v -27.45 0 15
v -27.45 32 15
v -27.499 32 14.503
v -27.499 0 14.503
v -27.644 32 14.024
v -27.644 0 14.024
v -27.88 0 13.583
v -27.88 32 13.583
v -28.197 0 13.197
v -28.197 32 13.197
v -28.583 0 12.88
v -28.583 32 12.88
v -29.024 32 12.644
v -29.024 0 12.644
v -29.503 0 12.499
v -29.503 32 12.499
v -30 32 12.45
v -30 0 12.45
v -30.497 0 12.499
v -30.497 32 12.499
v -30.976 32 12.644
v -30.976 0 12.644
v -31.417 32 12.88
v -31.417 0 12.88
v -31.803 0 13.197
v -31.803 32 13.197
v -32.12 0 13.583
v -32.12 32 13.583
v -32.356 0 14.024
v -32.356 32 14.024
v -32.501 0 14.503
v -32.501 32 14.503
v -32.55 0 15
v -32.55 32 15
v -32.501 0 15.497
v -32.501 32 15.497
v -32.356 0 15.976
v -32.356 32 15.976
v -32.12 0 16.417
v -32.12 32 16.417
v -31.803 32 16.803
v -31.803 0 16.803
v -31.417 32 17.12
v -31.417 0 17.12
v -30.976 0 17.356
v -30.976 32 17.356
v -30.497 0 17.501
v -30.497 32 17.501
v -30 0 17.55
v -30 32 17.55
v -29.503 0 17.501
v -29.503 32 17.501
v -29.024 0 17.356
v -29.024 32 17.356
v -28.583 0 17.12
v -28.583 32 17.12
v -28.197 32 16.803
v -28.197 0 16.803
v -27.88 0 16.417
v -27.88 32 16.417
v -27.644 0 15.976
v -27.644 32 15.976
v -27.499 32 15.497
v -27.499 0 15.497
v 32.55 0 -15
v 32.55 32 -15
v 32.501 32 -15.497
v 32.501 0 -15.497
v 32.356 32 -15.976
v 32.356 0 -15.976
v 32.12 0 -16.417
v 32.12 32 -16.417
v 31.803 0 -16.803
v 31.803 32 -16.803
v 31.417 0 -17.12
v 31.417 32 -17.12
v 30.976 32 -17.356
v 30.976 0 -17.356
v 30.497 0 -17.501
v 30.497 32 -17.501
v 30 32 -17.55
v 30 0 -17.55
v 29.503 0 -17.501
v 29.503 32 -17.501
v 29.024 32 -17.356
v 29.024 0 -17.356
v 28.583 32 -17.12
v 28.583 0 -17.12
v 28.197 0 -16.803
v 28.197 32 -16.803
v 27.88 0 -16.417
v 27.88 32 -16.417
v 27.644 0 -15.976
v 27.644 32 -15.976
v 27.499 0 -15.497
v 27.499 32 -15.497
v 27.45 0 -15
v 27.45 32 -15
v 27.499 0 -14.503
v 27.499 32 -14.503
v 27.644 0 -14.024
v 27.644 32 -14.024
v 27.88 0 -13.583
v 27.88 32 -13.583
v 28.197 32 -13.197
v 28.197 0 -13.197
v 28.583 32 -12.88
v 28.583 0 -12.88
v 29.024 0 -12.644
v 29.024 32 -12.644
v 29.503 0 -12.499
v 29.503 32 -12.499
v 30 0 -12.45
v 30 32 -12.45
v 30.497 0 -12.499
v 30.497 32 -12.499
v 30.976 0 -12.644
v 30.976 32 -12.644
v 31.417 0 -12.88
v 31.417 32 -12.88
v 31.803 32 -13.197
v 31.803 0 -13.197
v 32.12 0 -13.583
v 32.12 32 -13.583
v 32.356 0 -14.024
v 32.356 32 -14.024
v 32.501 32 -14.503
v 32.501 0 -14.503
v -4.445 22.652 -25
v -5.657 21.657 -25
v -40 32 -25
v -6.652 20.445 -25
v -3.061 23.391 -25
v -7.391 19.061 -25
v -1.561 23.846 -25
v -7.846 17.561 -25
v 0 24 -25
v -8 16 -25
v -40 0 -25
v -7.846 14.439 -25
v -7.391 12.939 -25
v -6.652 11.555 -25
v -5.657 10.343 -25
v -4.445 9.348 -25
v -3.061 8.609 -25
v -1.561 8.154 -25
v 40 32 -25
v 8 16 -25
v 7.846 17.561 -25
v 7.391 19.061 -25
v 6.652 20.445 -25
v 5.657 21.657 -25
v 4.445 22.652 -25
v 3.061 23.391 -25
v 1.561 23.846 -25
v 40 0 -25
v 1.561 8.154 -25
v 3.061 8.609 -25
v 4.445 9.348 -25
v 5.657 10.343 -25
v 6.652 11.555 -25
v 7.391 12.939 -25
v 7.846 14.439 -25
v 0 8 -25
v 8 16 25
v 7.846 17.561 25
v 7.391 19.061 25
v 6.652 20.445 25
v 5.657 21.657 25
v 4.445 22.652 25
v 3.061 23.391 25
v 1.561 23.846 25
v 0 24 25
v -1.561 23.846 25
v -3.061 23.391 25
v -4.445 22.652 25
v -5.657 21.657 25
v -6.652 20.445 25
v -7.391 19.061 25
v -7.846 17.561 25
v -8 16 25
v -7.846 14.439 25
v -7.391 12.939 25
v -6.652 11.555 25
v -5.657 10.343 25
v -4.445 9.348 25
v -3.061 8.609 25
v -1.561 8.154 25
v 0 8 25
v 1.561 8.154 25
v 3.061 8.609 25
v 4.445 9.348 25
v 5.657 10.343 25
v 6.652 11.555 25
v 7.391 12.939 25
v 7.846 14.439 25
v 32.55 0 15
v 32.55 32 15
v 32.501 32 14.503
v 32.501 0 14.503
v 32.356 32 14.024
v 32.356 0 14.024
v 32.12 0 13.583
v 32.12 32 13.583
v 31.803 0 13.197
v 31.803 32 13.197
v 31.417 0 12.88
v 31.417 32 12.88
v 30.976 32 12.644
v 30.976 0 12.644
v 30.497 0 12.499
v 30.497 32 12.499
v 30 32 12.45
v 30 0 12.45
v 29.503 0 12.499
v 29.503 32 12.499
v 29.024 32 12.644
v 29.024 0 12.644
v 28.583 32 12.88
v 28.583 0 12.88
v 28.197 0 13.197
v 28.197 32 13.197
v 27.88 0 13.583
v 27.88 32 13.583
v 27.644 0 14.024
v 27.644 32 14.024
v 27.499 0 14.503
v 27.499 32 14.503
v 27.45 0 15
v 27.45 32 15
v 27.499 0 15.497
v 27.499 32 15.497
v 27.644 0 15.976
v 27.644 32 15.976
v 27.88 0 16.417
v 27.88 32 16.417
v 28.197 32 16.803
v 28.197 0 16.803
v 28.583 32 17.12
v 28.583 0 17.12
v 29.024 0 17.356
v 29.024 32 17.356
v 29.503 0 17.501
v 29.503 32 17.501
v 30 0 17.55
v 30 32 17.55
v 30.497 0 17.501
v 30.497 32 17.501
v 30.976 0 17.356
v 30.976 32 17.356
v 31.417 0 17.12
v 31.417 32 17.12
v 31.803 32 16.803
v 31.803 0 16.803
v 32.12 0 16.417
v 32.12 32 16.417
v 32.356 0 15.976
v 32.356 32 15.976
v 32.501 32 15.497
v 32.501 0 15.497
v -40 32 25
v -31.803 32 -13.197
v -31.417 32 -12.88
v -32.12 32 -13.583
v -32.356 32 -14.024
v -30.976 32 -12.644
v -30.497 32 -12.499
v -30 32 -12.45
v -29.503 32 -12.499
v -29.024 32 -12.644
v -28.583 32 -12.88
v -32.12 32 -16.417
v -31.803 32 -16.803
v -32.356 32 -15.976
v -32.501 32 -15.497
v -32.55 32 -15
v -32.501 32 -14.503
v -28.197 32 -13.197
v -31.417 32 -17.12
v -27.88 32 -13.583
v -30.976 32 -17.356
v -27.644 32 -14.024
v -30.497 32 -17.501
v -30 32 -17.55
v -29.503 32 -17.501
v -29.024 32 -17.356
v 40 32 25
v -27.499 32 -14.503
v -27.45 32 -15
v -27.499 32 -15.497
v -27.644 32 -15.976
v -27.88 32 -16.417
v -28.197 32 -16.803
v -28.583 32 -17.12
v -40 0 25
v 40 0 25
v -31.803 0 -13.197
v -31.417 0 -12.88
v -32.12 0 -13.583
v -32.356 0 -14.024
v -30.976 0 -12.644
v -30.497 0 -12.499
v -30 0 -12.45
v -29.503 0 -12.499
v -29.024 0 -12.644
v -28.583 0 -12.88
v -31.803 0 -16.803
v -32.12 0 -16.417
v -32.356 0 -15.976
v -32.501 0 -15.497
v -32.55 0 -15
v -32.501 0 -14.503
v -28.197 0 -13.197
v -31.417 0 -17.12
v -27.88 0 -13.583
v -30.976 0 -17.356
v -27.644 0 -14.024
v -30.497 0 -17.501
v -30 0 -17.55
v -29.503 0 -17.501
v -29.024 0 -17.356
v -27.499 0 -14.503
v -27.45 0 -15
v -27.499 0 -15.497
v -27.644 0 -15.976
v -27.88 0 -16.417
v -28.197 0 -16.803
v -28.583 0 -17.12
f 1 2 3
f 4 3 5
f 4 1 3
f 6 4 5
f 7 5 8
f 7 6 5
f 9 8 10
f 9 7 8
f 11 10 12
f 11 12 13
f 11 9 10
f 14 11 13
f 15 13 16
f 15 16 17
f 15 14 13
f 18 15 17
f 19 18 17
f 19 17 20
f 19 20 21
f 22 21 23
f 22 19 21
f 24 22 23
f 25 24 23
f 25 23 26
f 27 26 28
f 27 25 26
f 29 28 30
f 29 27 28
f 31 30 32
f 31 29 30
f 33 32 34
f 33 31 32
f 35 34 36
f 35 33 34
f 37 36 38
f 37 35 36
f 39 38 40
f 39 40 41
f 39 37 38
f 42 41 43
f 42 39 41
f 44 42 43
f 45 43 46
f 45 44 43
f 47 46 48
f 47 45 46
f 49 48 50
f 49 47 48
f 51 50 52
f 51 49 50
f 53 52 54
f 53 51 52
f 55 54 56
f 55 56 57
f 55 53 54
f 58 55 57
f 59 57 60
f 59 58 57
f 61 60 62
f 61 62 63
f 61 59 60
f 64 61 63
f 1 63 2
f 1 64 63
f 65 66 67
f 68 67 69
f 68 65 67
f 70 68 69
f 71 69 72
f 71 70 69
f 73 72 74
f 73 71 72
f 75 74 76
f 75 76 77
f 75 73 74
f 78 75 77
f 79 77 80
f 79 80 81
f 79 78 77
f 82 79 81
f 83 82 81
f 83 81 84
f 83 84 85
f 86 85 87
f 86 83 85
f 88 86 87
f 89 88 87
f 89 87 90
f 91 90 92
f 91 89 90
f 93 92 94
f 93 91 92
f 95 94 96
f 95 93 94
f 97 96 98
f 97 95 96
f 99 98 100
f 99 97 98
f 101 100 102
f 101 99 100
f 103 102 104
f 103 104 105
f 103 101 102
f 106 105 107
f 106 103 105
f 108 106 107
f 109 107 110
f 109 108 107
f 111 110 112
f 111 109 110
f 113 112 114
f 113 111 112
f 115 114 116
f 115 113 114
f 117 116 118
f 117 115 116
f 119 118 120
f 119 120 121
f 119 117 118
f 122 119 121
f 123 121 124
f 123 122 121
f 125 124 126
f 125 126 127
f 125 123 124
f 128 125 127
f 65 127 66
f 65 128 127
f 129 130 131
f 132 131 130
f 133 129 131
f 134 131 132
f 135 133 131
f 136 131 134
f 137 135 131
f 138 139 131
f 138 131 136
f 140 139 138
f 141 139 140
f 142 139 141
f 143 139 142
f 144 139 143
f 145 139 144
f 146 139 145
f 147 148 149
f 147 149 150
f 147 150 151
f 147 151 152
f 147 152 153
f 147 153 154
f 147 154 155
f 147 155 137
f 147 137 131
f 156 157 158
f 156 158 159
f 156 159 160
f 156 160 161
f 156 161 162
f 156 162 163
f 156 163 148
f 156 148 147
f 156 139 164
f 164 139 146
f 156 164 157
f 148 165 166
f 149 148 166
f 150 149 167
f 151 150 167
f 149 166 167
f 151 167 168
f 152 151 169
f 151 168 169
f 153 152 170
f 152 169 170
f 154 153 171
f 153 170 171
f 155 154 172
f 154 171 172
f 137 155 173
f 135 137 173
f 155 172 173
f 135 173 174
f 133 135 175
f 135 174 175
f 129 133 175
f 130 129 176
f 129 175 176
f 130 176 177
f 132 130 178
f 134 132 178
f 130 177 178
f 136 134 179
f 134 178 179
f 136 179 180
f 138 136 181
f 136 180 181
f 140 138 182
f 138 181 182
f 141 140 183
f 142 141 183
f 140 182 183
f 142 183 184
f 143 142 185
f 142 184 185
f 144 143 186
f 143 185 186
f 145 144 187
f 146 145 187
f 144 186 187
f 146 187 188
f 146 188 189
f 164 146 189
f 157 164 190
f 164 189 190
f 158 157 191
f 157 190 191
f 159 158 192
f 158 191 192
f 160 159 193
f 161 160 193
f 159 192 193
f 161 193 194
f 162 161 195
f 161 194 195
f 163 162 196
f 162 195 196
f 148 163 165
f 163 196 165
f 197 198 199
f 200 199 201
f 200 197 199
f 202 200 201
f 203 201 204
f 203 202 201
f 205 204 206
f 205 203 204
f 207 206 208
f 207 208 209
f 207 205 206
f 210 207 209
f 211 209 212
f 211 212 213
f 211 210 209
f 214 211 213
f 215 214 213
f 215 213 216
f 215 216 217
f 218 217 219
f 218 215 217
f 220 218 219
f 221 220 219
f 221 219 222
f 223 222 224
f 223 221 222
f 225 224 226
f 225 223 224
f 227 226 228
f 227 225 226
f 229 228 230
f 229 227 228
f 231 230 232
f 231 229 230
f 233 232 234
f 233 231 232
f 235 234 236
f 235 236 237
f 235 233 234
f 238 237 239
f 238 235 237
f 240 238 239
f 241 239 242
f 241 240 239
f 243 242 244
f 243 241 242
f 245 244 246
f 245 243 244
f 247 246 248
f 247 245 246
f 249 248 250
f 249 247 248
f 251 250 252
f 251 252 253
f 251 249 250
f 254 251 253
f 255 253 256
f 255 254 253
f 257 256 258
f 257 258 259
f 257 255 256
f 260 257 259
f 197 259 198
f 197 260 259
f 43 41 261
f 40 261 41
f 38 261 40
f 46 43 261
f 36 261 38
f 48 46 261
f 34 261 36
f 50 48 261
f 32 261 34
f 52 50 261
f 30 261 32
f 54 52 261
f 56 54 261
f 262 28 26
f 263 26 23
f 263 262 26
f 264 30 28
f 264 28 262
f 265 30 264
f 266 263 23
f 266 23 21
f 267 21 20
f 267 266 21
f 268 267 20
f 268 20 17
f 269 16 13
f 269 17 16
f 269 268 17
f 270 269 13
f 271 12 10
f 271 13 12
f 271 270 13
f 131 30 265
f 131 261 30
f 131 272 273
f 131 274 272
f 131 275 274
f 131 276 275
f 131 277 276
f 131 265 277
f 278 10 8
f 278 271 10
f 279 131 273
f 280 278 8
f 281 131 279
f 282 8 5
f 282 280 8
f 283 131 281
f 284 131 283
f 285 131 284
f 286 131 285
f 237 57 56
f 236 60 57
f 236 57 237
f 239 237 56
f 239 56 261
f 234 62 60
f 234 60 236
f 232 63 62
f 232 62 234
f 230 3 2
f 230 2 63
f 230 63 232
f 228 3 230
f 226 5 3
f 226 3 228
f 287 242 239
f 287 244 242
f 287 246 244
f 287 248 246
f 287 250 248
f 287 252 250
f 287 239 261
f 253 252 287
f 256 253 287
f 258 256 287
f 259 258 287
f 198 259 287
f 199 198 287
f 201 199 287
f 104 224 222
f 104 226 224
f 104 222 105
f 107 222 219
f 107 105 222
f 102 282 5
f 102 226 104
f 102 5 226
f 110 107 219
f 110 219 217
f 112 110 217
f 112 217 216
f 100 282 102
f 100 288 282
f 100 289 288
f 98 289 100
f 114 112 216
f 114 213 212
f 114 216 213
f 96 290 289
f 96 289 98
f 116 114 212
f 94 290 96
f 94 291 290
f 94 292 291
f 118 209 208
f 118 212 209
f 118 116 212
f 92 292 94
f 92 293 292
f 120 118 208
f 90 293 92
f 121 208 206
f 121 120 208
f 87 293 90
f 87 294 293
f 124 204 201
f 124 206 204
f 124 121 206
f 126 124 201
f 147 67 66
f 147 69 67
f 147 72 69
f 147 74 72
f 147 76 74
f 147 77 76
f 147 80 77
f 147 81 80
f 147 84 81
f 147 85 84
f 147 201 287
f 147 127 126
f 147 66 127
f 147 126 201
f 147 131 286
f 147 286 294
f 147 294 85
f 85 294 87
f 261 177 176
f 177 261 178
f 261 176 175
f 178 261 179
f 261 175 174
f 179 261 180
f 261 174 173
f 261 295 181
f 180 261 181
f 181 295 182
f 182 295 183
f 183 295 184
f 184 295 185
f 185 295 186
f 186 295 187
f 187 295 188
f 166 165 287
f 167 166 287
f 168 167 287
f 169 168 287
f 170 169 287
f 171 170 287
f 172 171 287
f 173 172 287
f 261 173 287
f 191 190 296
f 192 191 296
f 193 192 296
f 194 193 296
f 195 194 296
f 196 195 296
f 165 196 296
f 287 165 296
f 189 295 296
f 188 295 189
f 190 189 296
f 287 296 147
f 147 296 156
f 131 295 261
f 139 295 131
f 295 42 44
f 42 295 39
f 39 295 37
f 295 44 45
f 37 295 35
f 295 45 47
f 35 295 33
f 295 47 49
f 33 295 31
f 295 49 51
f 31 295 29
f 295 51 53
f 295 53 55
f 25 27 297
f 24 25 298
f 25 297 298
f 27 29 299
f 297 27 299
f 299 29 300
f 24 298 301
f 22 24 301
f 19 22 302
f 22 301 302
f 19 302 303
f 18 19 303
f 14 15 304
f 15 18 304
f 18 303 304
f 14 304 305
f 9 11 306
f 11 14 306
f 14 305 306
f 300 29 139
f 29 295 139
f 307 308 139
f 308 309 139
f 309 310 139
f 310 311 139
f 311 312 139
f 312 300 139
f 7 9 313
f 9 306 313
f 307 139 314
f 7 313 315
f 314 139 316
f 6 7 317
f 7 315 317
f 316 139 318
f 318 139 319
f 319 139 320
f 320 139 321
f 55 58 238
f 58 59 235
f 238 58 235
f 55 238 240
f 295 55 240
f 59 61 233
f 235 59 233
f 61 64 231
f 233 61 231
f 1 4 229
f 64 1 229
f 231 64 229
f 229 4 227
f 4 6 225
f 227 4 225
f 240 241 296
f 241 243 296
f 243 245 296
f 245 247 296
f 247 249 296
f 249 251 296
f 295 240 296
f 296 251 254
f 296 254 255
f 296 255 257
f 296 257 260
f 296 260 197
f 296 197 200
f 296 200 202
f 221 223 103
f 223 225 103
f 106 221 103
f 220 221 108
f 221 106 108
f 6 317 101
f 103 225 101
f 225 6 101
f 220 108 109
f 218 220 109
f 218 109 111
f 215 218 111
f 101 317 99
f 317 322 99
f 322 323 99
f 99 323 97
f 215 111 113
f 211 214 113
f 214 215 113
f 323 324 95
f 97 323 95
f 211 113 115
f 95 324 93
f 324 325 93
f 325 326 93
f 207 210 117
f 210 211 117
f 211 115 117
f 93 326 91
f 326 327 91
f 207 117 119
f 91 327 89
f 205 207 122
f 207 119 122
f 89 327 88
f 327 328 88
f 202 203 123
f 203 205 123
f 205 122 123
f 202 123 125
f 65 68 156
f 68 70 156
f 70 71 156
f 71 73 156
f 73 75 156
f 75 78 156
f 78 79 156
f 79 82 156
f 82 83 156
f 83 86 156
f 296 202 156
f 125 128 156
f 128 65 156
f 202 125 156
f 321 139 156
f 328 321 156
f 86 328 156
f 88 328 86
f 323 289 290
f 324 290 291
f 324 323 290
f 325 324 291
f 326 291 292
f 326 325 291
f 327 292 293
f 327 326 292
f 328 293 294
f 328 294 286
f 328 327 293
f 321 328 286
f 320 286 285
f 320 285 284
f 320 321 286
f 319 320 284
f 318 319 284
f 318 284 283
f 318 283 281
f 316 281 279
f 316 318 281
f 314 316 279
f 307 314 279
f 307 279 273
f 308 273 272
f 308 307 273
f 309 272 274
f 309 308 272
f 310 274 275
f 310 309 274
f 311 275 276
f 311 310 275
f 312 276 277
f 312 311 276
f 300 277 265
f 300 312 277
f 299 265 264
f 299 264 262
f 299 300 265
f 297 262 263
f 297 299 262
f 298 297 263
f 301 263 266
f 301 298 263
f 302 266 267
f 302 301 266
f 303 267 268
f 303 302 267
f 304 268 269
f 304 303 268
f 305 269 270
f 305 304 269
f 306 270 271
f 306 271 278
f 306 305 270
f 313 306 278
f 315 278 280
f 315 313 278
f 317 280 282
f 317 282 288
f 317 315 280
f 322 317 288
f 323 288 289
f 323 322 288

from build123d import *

# Parameters (mm, degrees)
SKETCH1_W           = 80
SKETCH1_H           = 50
SKETCH1_R           = 2.55
BOSS_EXTRUDE1_DEPTH = 32
SKETCH2_R           = 8
CUT_EXTRUDE1_DEPTH  = 50


with BuildPart() as part:
    # Sketch1 → Boss-Extrude1 (new body)
    with BuildSketch(Plane(origin=(0, 0, 0), x_dir=(1, 0, 0), z_dir=(0, 1, 0))):
        Rectangle(SKETCH1_W, SKETCH1_H)
        with Locations((-30, 15)):
            Circle(SKETCH1_R, mode=Mode.SUBTRACT)
        with Locations((30, 15)):
            Circle(SKETCH1_R, mode=Mode.SUBTRACT)
        with Locations((30, -15)):
            Circle(SKETCH1_R, mode=Mode.SUBTRACT)
        with Locations((-30, -15)):
            Circle(SKETCH1_R, mode=Mode.SUBTRACT)
    extrude(amount=BOSS_EXTRUDE1_DEPTH)

    # Sketch2 → Cut-Extrude1 (cut)
    with BuildSketch(Plane.XY.offset(25)):
        with Locations((0, 16)):
            Circle(SKETCH2_R)
    extrude(amount=-CUT_EXTRUDE1_DEPTH, mode=Mode.SUBTRACT)


solid = part.part
